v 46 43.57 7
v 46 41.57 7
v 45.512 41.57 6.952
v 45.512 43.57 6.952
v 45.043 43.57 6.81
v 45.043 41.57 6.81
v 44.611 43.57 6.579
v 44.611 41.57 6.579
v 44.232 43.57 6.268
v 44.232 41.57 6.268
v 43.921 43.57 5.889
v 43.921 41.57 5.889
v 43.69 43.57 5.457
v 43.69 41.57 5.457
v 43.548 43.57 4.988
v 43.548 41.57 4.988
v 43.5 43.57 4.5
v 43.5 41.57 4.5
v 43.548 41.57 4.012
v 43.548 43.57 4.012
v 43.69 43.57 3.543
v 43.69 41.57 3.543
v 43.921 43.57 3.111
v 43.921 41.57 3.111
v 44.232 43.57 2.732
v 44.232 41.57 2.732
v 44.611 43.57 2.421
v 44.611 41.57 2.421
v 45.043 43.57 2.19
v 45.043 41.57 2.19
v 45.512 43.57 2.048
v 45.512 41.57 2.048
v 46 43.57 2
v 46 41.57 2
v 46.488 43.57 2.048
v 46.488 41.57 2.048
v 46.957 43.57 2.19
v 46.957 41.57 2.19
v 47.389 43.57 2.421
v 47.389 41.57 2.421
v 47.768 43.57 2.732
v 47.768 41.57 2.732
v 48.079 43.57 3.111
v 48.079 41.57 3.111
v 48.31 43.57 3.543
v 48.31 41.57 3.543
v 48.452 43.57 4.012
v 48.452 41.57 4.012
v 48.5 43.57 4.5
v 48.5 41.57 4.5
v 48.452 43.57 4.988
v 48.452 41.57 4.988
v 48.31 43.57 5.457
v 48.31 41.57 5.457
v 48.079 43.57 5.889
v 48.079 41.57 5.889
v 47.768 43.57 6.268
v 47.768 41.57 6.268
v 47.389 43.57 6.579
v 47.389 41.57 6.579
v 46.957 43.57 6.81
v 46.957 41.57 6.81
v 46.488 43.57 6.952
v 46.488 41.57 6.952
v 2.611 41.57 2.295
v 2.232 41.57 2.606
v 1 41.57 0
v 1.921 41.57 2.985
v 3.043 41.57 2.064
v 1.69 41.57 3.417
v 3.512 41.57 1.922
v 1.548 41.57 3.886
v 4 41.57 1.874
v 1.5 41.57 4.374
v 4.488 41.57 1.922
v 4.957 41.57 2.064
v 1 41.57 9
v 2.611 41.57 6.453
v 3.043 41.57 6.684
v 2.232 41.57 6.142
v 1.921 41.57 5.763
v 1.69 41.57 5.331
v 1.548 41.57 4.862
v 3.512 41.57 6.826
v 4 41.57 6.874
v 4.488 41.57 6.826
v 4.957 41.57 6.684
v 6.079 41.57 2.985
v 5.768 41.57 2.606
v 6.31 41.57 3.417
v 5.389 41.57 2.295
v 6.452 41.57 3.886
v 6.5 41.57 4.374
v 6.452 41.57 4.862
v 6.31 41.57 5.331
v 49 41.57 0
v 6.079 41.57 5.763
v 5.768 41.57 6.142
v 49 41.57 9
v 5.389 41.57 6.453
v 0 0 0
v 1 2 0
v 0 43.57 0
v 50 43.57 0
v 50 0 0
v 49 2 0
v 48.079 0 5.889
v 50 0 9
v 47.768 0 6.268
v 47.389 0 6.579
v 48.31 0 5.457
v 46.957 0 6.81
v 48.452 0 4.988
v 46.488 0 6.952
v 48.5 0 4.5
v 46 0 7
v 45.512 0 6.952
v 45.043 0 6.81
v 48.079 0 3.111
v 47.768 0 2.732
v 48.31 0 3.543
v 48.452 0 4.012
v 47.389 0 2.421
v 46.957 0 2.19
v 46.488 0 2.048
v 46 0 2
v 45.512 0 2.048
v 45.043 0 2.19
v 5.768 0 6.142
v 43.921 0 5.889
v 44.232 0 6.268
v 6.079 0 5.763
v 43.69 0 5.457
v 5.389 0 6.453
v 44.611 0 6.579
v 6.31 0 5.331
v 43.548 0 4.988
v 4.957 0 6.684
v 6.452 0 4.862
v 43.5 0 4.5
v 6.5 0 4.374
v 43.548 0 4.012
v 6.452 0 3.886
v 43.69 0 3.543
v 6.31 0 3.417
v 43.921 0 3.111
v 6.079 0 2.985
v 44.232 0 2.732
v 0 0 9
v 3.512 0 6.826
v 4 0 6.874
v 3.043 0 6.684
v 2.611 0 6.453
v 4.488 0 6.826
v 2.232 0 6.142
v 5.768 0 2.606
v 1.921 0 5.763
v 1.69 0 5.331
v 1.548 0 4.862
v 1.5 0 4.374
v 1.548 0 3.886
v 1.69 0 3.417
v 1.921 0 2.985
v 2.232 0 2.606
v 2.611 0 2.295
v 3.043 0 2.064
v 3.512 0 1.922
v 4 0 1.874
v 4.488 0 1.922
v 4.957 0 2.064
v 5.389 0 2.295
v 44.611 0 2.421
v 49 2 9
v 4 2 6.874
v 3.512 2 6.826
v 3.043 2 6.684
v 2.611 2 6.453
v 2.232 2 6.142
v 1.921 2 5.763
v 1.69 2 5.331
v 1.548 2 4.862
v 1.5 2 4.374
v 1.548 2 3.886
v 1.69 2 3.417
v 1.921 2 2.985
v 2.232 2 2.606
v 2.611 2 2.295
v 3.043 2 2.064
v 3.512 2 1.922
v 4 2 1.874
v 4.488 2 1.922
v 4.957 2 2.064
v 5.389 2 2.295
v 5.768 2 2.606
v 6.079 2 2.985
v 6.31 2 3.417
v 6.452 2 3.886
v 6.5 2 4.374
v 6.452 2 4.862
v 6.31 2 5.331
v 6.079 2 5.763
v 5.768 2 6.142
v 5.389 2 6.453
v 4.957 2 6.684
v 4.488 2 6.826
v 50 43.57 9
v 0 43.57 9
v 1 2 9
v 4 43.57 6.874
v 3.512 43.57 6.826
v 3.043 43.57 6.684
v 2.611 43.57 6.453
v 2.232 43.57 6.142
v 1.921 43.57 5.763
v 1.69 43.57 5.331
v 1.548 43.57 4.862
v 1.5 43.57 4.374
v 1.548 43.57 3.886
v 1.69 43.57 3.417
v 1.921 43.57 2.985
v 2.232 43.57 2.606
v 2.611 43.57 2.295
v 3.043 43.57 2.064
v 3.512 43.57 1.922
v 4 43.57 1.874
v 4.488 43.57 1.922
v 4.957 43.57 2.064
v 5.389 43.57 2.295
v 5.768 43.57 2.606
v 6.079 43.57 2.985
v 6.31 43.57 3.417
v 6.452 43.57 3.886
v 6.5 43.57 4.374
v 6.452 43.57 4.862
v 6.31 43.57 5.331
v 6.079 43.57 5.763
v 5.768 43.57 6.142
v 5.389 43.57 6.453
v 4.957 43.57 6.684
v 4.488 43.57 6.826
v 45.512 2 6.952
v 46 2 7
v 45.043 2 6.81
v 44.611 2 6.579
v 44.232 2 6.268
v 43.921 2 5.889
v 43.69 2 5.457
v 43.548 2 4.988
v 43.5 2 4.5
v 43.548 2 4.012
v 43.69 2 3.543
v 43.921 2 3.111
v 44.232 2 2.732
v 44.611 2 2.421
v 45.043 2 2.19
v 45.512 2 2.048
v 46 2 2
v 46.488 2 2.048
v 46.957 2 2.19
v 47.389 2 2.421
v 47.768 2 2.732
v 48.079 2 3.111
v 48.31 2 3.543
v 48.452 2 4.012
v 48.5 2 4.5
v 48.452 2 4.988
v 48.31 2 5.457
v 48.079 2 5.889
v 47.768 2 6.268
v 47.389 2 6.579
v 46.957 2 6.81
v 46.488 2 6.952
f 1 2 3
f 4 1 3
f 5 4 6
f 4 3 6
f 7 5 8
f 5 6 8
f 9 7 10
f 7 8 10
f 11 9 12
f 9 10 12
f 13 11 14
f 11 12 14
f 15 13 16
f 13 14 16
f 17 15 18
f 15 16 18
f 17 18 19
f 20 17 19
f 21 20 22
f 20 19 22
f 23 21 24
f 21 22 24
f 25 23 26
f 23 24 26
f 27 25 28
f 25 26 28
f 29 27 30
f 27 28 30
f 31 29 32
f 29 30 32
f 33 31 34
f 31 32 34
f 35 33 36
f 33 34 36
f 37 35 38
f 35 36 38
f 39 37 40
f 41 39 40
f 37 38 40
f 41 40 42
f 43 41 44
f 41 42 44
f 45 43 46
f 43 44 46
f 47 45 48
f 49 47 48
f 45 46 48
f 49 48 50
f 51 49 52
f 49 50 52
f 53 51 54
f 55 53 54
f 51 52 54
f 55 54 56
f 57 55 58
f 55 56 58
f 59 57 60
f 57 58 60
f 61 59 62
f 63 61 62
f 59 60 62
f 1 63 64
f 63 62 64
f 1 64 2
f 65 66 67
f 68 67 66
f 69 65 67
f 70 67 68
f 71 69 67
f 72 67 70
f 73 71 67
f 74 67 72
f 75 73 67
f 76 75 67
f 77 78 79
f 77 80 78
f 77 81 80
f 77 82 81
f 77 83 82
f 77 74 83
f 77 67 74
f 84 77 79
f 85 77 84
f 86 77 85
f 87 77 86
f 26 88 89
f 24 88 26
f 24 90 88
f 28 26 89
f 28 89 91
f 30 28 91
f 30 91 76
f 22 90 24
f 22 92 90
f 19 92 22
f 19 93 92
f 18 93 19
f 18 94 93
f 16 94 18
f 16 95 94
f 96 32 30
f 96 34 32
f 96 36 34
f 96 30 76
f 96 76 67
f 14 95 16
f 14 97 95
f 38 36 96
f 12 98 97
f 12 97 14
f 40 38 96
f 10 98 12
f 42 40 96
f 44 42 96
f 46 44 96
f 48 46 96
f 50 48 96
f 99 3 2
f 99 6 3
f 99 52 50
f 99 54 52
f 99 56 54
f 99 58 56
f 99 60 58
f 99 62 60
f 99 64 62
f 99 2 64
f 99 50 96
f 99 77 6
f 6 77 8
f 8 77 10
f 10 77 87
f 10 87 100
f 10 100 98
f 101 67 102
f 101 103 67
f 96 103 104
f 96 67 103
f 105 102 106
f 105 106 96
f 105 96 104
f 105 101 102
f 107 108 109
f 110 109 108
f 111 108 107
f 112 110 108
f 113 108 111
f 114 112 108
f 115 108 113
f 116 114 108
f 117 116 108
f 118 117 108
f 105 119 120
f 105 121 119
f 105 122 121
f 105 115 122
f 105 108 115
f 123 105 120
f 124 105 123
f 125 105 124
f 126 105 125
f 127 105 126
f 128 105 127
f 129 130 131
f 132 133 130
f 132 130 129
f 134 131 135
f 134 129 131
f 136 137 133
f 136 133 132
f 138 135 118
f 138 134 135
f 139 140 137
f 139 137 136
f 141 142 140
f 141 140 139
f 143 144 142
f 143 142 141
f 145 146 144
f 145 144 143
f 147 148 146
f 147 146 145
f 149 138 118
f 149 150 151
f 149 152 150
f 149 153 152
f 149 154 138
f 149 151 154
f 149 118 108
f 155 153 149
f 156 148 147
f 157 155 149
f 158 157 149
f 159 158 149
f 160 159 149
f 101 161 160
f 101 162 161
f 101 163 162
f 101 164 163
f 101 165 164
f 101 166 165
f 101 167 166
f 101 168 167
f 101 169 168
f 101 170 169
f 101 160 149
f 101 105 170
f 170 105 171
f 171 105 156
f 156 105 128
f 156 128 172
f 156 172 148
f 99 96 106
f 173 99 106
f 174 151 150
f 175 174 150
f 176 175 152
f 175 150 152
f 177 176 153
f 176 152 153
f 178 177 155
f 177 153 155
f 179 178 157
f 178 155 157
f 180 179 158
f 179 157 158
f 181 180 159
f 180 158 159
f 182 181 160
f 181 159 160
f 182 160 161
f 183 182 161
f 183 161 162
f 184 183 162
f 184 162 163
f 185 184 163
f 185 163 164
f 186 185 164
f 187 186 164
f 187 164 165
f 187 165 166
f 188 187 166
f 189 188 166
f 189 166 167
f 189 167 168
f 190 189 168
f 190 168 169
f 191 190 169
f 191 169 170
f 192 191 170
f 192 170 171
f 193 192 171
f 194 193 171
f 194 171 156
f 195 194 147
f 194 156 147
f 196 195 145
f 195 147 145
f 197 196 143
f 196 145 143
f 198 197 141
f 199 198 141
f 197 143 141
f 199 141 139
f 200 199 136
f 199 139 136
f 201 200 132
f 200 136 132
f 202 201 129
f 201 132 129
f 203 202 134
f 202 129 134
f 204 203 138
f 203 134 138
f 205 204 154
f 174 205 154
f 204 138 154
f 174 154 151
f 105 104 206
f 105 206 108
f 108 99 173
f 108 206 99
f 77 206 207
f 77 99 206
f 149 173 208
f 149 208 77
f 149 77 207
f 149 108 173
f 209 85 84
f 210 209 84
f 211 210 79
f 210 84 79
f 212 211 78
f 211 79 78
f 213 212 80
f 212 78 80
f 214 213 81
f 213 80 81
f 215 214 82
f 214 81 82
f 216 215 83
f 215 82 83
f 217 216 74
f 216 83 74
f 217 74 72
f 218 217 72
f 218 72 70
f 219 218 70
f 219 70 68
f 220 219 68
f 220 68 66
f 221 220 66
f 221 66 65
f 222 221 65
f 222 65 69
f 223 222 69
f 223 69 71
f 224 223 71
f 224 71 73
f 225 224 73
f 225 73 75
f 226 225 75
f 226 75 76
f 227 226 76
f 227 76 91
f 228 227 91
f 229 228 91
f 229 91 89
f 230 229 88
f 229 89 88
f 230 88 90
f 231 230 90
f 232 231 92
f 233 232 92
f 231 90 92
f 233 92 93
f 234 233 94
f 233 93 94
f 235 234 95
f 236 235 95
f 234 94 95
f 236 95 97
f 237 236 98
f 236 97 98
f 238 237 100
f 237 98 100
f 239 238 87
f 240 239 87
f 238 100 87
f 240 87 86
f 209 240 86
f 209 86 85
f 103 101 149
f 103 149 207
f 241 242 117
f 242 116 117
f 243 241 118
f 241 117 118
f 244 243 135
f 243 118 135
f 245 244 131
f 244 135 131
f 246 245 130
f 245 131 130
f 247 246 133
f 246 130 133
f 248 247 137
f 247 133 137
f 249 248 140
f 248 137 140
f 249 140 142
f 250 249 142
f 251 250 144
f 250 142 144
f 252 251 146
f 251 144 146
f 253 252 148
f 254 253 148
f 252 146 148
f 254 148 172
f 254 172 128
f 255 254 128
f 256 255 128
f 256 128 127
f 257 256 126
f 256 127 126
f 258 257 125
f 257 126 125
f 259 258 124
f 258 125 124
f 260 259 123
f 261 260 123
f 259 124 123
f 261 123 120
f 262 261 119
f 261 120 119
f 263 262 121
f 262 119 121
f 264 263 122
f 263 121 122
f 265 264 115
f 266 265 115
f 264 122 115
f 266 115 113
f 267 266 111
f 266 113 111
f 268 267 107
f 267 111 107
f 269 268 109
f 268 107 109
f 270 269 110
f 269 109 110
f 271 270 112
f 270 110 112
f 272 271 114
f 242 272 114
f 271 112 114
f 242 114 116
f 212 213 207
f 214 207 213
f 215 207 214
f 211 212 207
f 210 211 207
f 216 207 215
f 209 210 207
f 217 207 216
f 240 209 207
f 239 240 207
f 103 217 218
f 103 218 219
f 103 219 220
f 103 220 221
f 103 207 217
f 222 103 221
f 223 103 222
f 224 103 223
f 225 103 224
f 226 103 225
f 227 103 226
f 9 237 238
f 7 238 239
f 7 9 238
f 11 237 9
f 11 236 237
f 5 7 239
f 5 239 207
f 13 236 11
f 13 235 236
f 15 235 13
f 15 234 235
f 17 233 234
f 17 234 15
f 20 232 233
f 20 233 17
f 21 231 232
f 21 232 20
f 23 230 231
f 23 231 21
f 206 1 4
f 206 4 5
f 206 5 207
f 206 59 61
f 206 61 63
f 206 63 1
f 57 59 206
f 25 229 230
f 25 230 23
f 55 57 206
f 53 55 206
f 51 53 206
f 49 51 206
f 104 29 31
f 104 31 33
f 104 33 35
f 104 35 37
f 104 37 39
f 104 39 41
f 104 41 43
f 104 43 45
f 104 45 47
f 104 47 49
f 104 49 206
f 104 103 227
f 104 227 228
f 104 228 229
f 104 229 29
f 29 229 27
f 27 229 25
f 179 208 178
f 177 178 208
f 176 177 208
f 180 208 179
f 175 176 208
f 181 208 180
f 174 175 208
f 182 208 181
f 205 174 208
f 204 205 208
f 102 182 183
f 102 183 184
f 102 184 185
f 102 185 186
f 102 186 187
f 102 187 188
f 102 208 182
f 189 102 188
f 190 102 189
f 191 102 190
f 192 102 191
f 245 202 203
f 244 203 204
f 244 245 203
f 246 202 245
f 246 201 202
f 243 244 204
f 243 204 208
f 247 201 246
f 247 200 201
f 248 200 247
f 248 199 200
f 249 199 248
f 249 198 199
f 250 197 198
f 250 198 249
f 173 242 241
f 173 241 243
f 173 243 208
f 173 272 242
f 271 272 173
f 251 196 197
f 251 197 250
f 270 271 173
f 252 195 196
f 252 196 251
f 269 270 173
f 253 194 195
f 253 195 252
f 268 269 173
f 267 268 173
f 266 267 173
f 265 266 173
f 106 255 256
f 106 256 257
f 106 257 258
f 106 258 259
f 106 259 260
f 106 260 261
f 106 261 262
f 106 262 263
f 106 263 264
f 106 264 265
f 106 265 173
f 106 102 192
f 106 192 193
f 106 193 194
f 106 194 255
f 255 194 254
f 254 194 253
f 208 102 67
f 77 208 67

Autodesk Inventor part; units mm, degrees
ref_plane "YZ Plane" through (0, 0, 0) normal (1, 0, 0) x (0, 1, 0)
ref_plane "XZ Plane" through (0, 0, 0) normal (0, 1, 0) x (-1, 0, 0)
ref_plane "XY Plane" through (0, 0, 0) normal (0, 0, 1) x (1, 0, 0)
sketch "Sketch1" plane through (0, 0, 0) normal (0, 0, 1) x (1, 0, 0)
  line L0 (0, 0) -> (0, 43.57)
  line L1 (0, 43.57) -> (50, 43.57)
  line L2 (50, 43.57) -> (50, 0)
  line L3 (50, 0) -> (0, 0)
  line L4 (1, 1) -> (1, 42.57)
  line L5 (1, 42.57) -> (49, 42.57)
  line L6 (49, 42.57) -> (49, 1)
  line L7 (49, 1) -> (1, 1)
  dimension "d0" = 43.57
  dimension "d1" = 50
  dimension "d2" = 41.57
  dimension "d3" = 48
extrude "Extrusion1" add sketch "Sketch1" along normal blind 9
sketch "Sketch2" plane through (1, 42.57, 0) normal (0, -1, 0) x (1, 0, 0)
  line L0 (48, 0) -> (0, 0) projected
  line L1 (48, 0) -> (48, 9) projected
  line L2 (0, 9) -> (48, 9) projected
  line L3 (0, 0) -> (0, 9) projected
  point P0 (-1, 0)
extrude "Extrusion2" add sketch "Sketch2" along normal blind 1
sketch "Sketch3" plane through (1, 1, 0) normal (0, 1, 0) x (1, 0, 0)
  line L0 (0, 0) -> (48, 0) projected
  line L1 (0, 0) -> (0, -9) projected
  line L2 (48, -9) -> (0, -9) projected
  line L3 (48, 0) -> (48, -9) projected
  point P0 (-1, 0)
extrude "Extrusion3" add sketch "Sketch3" along normal blind 1
sketch "Sketch4" plane through (0, 43.57, 0) normal (0, 1, 0) x (1, 0, 0)
  point P0 (4, -4.3741)
  point P1 (46, -4.5)
hole "Hole1" at (4, 43.57, 4.3741) at (46, 43.57, 4.5) direction (0, -1, 0) diameter 5 end through all
properties part number "Hoofdplaat zijkant"
